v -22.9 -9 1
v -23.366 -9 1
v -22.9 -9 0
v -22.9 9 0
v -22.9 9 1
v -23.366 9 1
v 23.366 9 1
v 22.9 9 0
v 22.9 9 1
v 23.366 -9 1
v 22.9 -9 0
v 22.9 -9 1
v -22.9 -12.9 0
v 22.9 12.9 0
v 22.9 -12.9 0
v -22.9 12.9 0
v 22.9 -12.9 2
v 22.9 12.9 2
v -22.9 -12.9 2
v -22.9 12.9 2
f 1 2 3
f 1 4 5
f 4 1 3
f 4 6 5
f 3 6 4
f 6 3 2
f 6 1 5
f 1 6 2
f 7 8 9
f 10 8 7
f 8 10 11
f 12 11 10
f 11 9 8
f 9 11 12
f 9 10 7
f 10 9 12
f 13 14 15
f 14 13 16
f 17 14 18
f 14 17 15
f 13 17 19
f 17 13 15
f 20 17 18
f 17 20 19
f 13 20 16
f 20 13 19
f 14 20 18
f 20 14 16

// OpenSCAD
// ================================================================
// PARAMETRIC BOX
// ================================================================

Tolerance = 0.1;
Width = 50;
Height = 30;
Depth = 10;
Thick = 4;
LeafHole =2;

//pbox(false,Width,Height,Depth,Thick,LeafHole);
//translate([0,0,Depth+10])
pcover(Width,Height,Thick);

module pbox(showCover=true, boxWidth, boxHeight, boxDepth, boxThick,boxLeafHole) {

    // the box itself =============================================
    difference() {
        linear_extrude(height=boxDepth) 
        difference() {
            minkowski() {
                polygon([ [-boxWidth/2+boxThick,-boxHeight/2+boxThick],
                          [-boxWidth/2+boxThick,boxHeight/2-boxThick],
                          [boxWidth/2-boxThick,boxHeight/2-boxThick],
                          [boxWidth/2-boxThick,-boxHeight/2+boxThick]
                    ]);
                circle(r=boxThick,$fn=100);
            }

            polygon([ [-boxWidth/2+boxThick,-boxHeight/2+boxThick],
                      [-boxWidth/2+boxThick,boxHeight/2-boxThick],
                      [boxWidth/2-boxThick,boxHeight/2-boxThick],
                      [boxWidth/2-boxThick,-boxHeight/2+boxThick]
               ]);
        }
    
        translate([0,0,boxDepth-boxThick/2])
        linear_extrude(height=boxThick/2)    
        polygon([ [-boxWidth/2+boxThick/2,-boxHeight/2+boxThick/2],
                      [-boxWidth/2+boxThick/2,boxHeight/2-boxThick/2],
                      [boxWidth/2-boxThick/2,boxHeight/2-boxThick/2],
                      [boxWidth/2-boxThick/2,-boxHeight/2+boxThick/2]
               ]);
        
    
        // creates the holes in the box to accomodate cover locks
        for(i=[-1,1]) { 
            translate([i*(boxWidth/2-Tolerance-boxThick/2),0,boxDepth-boxThick/2]) 
            rotate([0,0,i==-1?180:0])
            holder(boxHeight,boxThick,Tolerance);
        }   
    }
    // the screws holders part =====================================
    for(i=[-1,1]) {
        for(j=[-1,1]) {
            translate([i*boxWidth/3,j*(boxHeight/2-boxThick*2),0])
            rotate([0,0,j<0? 180 : 0])
            linear_extrude(height=boxThick/2)
            difference() {
                union() { 
                    circle(r=boxThick,$fn=100);
                    translate([-boxThick,0,0]) square([boxThick*2,boxThick]);
                }
                circle(d=boxLeafHole,$fn=100);
            }
        }
    }
    
    // the box cover =============================================
    if(showCover==true) 
        translate([0,0,boxDepth-boxThick/2])
        pcover(boxWidth, boxHeight, boxThick);
}

module pcover(boxWidth, boxHeight, boxThick) {
   linear_extrude(height=boxThick/2)    
   polygon([ [-boxWidth/2+boxThick/2+Tolerance,-boxHeight/2+boxThick/2+Tolerance],
                  [-boxWidth/2+boxThick/2+Tolerance,boxHeight/2-boxThick/2-Tolerance],
                  [boxWidth/2-boxThick/2-Tolerance,boxHeight/2-boxThick/2-Tolerance],
                  [boxWidth/2-boxThick/2-Tolerance,-boxHeight/2+boxThick/2+Tolerance]
           ]);
    
    for(i=[-1,1]) { 
        translate([i*(boxWidth/2-Tolerance-boxThick/2),0,0]) 
        rotate([0,0,i==-1?180:0])
        holder(boxHeight,boxThick);
    }   
}



module holder(boxHeight,boxThick,Tolerance=0) {
    L = (boxThick/4+Tolerance) * sin(25)/cos(25);
    
    translate([0,(boxHeight*.6+2*Tolerance)/2,0])
    rotate([90,0,0])
        linear_extrude(height=boxHeight*.6+2*Tolerance) 
        polygon([ [0,0],
                  [0,boxThick/4+Tolerance],
                  [L+Tolerance,boxThick/4+Tolerance]
            ]);
}
